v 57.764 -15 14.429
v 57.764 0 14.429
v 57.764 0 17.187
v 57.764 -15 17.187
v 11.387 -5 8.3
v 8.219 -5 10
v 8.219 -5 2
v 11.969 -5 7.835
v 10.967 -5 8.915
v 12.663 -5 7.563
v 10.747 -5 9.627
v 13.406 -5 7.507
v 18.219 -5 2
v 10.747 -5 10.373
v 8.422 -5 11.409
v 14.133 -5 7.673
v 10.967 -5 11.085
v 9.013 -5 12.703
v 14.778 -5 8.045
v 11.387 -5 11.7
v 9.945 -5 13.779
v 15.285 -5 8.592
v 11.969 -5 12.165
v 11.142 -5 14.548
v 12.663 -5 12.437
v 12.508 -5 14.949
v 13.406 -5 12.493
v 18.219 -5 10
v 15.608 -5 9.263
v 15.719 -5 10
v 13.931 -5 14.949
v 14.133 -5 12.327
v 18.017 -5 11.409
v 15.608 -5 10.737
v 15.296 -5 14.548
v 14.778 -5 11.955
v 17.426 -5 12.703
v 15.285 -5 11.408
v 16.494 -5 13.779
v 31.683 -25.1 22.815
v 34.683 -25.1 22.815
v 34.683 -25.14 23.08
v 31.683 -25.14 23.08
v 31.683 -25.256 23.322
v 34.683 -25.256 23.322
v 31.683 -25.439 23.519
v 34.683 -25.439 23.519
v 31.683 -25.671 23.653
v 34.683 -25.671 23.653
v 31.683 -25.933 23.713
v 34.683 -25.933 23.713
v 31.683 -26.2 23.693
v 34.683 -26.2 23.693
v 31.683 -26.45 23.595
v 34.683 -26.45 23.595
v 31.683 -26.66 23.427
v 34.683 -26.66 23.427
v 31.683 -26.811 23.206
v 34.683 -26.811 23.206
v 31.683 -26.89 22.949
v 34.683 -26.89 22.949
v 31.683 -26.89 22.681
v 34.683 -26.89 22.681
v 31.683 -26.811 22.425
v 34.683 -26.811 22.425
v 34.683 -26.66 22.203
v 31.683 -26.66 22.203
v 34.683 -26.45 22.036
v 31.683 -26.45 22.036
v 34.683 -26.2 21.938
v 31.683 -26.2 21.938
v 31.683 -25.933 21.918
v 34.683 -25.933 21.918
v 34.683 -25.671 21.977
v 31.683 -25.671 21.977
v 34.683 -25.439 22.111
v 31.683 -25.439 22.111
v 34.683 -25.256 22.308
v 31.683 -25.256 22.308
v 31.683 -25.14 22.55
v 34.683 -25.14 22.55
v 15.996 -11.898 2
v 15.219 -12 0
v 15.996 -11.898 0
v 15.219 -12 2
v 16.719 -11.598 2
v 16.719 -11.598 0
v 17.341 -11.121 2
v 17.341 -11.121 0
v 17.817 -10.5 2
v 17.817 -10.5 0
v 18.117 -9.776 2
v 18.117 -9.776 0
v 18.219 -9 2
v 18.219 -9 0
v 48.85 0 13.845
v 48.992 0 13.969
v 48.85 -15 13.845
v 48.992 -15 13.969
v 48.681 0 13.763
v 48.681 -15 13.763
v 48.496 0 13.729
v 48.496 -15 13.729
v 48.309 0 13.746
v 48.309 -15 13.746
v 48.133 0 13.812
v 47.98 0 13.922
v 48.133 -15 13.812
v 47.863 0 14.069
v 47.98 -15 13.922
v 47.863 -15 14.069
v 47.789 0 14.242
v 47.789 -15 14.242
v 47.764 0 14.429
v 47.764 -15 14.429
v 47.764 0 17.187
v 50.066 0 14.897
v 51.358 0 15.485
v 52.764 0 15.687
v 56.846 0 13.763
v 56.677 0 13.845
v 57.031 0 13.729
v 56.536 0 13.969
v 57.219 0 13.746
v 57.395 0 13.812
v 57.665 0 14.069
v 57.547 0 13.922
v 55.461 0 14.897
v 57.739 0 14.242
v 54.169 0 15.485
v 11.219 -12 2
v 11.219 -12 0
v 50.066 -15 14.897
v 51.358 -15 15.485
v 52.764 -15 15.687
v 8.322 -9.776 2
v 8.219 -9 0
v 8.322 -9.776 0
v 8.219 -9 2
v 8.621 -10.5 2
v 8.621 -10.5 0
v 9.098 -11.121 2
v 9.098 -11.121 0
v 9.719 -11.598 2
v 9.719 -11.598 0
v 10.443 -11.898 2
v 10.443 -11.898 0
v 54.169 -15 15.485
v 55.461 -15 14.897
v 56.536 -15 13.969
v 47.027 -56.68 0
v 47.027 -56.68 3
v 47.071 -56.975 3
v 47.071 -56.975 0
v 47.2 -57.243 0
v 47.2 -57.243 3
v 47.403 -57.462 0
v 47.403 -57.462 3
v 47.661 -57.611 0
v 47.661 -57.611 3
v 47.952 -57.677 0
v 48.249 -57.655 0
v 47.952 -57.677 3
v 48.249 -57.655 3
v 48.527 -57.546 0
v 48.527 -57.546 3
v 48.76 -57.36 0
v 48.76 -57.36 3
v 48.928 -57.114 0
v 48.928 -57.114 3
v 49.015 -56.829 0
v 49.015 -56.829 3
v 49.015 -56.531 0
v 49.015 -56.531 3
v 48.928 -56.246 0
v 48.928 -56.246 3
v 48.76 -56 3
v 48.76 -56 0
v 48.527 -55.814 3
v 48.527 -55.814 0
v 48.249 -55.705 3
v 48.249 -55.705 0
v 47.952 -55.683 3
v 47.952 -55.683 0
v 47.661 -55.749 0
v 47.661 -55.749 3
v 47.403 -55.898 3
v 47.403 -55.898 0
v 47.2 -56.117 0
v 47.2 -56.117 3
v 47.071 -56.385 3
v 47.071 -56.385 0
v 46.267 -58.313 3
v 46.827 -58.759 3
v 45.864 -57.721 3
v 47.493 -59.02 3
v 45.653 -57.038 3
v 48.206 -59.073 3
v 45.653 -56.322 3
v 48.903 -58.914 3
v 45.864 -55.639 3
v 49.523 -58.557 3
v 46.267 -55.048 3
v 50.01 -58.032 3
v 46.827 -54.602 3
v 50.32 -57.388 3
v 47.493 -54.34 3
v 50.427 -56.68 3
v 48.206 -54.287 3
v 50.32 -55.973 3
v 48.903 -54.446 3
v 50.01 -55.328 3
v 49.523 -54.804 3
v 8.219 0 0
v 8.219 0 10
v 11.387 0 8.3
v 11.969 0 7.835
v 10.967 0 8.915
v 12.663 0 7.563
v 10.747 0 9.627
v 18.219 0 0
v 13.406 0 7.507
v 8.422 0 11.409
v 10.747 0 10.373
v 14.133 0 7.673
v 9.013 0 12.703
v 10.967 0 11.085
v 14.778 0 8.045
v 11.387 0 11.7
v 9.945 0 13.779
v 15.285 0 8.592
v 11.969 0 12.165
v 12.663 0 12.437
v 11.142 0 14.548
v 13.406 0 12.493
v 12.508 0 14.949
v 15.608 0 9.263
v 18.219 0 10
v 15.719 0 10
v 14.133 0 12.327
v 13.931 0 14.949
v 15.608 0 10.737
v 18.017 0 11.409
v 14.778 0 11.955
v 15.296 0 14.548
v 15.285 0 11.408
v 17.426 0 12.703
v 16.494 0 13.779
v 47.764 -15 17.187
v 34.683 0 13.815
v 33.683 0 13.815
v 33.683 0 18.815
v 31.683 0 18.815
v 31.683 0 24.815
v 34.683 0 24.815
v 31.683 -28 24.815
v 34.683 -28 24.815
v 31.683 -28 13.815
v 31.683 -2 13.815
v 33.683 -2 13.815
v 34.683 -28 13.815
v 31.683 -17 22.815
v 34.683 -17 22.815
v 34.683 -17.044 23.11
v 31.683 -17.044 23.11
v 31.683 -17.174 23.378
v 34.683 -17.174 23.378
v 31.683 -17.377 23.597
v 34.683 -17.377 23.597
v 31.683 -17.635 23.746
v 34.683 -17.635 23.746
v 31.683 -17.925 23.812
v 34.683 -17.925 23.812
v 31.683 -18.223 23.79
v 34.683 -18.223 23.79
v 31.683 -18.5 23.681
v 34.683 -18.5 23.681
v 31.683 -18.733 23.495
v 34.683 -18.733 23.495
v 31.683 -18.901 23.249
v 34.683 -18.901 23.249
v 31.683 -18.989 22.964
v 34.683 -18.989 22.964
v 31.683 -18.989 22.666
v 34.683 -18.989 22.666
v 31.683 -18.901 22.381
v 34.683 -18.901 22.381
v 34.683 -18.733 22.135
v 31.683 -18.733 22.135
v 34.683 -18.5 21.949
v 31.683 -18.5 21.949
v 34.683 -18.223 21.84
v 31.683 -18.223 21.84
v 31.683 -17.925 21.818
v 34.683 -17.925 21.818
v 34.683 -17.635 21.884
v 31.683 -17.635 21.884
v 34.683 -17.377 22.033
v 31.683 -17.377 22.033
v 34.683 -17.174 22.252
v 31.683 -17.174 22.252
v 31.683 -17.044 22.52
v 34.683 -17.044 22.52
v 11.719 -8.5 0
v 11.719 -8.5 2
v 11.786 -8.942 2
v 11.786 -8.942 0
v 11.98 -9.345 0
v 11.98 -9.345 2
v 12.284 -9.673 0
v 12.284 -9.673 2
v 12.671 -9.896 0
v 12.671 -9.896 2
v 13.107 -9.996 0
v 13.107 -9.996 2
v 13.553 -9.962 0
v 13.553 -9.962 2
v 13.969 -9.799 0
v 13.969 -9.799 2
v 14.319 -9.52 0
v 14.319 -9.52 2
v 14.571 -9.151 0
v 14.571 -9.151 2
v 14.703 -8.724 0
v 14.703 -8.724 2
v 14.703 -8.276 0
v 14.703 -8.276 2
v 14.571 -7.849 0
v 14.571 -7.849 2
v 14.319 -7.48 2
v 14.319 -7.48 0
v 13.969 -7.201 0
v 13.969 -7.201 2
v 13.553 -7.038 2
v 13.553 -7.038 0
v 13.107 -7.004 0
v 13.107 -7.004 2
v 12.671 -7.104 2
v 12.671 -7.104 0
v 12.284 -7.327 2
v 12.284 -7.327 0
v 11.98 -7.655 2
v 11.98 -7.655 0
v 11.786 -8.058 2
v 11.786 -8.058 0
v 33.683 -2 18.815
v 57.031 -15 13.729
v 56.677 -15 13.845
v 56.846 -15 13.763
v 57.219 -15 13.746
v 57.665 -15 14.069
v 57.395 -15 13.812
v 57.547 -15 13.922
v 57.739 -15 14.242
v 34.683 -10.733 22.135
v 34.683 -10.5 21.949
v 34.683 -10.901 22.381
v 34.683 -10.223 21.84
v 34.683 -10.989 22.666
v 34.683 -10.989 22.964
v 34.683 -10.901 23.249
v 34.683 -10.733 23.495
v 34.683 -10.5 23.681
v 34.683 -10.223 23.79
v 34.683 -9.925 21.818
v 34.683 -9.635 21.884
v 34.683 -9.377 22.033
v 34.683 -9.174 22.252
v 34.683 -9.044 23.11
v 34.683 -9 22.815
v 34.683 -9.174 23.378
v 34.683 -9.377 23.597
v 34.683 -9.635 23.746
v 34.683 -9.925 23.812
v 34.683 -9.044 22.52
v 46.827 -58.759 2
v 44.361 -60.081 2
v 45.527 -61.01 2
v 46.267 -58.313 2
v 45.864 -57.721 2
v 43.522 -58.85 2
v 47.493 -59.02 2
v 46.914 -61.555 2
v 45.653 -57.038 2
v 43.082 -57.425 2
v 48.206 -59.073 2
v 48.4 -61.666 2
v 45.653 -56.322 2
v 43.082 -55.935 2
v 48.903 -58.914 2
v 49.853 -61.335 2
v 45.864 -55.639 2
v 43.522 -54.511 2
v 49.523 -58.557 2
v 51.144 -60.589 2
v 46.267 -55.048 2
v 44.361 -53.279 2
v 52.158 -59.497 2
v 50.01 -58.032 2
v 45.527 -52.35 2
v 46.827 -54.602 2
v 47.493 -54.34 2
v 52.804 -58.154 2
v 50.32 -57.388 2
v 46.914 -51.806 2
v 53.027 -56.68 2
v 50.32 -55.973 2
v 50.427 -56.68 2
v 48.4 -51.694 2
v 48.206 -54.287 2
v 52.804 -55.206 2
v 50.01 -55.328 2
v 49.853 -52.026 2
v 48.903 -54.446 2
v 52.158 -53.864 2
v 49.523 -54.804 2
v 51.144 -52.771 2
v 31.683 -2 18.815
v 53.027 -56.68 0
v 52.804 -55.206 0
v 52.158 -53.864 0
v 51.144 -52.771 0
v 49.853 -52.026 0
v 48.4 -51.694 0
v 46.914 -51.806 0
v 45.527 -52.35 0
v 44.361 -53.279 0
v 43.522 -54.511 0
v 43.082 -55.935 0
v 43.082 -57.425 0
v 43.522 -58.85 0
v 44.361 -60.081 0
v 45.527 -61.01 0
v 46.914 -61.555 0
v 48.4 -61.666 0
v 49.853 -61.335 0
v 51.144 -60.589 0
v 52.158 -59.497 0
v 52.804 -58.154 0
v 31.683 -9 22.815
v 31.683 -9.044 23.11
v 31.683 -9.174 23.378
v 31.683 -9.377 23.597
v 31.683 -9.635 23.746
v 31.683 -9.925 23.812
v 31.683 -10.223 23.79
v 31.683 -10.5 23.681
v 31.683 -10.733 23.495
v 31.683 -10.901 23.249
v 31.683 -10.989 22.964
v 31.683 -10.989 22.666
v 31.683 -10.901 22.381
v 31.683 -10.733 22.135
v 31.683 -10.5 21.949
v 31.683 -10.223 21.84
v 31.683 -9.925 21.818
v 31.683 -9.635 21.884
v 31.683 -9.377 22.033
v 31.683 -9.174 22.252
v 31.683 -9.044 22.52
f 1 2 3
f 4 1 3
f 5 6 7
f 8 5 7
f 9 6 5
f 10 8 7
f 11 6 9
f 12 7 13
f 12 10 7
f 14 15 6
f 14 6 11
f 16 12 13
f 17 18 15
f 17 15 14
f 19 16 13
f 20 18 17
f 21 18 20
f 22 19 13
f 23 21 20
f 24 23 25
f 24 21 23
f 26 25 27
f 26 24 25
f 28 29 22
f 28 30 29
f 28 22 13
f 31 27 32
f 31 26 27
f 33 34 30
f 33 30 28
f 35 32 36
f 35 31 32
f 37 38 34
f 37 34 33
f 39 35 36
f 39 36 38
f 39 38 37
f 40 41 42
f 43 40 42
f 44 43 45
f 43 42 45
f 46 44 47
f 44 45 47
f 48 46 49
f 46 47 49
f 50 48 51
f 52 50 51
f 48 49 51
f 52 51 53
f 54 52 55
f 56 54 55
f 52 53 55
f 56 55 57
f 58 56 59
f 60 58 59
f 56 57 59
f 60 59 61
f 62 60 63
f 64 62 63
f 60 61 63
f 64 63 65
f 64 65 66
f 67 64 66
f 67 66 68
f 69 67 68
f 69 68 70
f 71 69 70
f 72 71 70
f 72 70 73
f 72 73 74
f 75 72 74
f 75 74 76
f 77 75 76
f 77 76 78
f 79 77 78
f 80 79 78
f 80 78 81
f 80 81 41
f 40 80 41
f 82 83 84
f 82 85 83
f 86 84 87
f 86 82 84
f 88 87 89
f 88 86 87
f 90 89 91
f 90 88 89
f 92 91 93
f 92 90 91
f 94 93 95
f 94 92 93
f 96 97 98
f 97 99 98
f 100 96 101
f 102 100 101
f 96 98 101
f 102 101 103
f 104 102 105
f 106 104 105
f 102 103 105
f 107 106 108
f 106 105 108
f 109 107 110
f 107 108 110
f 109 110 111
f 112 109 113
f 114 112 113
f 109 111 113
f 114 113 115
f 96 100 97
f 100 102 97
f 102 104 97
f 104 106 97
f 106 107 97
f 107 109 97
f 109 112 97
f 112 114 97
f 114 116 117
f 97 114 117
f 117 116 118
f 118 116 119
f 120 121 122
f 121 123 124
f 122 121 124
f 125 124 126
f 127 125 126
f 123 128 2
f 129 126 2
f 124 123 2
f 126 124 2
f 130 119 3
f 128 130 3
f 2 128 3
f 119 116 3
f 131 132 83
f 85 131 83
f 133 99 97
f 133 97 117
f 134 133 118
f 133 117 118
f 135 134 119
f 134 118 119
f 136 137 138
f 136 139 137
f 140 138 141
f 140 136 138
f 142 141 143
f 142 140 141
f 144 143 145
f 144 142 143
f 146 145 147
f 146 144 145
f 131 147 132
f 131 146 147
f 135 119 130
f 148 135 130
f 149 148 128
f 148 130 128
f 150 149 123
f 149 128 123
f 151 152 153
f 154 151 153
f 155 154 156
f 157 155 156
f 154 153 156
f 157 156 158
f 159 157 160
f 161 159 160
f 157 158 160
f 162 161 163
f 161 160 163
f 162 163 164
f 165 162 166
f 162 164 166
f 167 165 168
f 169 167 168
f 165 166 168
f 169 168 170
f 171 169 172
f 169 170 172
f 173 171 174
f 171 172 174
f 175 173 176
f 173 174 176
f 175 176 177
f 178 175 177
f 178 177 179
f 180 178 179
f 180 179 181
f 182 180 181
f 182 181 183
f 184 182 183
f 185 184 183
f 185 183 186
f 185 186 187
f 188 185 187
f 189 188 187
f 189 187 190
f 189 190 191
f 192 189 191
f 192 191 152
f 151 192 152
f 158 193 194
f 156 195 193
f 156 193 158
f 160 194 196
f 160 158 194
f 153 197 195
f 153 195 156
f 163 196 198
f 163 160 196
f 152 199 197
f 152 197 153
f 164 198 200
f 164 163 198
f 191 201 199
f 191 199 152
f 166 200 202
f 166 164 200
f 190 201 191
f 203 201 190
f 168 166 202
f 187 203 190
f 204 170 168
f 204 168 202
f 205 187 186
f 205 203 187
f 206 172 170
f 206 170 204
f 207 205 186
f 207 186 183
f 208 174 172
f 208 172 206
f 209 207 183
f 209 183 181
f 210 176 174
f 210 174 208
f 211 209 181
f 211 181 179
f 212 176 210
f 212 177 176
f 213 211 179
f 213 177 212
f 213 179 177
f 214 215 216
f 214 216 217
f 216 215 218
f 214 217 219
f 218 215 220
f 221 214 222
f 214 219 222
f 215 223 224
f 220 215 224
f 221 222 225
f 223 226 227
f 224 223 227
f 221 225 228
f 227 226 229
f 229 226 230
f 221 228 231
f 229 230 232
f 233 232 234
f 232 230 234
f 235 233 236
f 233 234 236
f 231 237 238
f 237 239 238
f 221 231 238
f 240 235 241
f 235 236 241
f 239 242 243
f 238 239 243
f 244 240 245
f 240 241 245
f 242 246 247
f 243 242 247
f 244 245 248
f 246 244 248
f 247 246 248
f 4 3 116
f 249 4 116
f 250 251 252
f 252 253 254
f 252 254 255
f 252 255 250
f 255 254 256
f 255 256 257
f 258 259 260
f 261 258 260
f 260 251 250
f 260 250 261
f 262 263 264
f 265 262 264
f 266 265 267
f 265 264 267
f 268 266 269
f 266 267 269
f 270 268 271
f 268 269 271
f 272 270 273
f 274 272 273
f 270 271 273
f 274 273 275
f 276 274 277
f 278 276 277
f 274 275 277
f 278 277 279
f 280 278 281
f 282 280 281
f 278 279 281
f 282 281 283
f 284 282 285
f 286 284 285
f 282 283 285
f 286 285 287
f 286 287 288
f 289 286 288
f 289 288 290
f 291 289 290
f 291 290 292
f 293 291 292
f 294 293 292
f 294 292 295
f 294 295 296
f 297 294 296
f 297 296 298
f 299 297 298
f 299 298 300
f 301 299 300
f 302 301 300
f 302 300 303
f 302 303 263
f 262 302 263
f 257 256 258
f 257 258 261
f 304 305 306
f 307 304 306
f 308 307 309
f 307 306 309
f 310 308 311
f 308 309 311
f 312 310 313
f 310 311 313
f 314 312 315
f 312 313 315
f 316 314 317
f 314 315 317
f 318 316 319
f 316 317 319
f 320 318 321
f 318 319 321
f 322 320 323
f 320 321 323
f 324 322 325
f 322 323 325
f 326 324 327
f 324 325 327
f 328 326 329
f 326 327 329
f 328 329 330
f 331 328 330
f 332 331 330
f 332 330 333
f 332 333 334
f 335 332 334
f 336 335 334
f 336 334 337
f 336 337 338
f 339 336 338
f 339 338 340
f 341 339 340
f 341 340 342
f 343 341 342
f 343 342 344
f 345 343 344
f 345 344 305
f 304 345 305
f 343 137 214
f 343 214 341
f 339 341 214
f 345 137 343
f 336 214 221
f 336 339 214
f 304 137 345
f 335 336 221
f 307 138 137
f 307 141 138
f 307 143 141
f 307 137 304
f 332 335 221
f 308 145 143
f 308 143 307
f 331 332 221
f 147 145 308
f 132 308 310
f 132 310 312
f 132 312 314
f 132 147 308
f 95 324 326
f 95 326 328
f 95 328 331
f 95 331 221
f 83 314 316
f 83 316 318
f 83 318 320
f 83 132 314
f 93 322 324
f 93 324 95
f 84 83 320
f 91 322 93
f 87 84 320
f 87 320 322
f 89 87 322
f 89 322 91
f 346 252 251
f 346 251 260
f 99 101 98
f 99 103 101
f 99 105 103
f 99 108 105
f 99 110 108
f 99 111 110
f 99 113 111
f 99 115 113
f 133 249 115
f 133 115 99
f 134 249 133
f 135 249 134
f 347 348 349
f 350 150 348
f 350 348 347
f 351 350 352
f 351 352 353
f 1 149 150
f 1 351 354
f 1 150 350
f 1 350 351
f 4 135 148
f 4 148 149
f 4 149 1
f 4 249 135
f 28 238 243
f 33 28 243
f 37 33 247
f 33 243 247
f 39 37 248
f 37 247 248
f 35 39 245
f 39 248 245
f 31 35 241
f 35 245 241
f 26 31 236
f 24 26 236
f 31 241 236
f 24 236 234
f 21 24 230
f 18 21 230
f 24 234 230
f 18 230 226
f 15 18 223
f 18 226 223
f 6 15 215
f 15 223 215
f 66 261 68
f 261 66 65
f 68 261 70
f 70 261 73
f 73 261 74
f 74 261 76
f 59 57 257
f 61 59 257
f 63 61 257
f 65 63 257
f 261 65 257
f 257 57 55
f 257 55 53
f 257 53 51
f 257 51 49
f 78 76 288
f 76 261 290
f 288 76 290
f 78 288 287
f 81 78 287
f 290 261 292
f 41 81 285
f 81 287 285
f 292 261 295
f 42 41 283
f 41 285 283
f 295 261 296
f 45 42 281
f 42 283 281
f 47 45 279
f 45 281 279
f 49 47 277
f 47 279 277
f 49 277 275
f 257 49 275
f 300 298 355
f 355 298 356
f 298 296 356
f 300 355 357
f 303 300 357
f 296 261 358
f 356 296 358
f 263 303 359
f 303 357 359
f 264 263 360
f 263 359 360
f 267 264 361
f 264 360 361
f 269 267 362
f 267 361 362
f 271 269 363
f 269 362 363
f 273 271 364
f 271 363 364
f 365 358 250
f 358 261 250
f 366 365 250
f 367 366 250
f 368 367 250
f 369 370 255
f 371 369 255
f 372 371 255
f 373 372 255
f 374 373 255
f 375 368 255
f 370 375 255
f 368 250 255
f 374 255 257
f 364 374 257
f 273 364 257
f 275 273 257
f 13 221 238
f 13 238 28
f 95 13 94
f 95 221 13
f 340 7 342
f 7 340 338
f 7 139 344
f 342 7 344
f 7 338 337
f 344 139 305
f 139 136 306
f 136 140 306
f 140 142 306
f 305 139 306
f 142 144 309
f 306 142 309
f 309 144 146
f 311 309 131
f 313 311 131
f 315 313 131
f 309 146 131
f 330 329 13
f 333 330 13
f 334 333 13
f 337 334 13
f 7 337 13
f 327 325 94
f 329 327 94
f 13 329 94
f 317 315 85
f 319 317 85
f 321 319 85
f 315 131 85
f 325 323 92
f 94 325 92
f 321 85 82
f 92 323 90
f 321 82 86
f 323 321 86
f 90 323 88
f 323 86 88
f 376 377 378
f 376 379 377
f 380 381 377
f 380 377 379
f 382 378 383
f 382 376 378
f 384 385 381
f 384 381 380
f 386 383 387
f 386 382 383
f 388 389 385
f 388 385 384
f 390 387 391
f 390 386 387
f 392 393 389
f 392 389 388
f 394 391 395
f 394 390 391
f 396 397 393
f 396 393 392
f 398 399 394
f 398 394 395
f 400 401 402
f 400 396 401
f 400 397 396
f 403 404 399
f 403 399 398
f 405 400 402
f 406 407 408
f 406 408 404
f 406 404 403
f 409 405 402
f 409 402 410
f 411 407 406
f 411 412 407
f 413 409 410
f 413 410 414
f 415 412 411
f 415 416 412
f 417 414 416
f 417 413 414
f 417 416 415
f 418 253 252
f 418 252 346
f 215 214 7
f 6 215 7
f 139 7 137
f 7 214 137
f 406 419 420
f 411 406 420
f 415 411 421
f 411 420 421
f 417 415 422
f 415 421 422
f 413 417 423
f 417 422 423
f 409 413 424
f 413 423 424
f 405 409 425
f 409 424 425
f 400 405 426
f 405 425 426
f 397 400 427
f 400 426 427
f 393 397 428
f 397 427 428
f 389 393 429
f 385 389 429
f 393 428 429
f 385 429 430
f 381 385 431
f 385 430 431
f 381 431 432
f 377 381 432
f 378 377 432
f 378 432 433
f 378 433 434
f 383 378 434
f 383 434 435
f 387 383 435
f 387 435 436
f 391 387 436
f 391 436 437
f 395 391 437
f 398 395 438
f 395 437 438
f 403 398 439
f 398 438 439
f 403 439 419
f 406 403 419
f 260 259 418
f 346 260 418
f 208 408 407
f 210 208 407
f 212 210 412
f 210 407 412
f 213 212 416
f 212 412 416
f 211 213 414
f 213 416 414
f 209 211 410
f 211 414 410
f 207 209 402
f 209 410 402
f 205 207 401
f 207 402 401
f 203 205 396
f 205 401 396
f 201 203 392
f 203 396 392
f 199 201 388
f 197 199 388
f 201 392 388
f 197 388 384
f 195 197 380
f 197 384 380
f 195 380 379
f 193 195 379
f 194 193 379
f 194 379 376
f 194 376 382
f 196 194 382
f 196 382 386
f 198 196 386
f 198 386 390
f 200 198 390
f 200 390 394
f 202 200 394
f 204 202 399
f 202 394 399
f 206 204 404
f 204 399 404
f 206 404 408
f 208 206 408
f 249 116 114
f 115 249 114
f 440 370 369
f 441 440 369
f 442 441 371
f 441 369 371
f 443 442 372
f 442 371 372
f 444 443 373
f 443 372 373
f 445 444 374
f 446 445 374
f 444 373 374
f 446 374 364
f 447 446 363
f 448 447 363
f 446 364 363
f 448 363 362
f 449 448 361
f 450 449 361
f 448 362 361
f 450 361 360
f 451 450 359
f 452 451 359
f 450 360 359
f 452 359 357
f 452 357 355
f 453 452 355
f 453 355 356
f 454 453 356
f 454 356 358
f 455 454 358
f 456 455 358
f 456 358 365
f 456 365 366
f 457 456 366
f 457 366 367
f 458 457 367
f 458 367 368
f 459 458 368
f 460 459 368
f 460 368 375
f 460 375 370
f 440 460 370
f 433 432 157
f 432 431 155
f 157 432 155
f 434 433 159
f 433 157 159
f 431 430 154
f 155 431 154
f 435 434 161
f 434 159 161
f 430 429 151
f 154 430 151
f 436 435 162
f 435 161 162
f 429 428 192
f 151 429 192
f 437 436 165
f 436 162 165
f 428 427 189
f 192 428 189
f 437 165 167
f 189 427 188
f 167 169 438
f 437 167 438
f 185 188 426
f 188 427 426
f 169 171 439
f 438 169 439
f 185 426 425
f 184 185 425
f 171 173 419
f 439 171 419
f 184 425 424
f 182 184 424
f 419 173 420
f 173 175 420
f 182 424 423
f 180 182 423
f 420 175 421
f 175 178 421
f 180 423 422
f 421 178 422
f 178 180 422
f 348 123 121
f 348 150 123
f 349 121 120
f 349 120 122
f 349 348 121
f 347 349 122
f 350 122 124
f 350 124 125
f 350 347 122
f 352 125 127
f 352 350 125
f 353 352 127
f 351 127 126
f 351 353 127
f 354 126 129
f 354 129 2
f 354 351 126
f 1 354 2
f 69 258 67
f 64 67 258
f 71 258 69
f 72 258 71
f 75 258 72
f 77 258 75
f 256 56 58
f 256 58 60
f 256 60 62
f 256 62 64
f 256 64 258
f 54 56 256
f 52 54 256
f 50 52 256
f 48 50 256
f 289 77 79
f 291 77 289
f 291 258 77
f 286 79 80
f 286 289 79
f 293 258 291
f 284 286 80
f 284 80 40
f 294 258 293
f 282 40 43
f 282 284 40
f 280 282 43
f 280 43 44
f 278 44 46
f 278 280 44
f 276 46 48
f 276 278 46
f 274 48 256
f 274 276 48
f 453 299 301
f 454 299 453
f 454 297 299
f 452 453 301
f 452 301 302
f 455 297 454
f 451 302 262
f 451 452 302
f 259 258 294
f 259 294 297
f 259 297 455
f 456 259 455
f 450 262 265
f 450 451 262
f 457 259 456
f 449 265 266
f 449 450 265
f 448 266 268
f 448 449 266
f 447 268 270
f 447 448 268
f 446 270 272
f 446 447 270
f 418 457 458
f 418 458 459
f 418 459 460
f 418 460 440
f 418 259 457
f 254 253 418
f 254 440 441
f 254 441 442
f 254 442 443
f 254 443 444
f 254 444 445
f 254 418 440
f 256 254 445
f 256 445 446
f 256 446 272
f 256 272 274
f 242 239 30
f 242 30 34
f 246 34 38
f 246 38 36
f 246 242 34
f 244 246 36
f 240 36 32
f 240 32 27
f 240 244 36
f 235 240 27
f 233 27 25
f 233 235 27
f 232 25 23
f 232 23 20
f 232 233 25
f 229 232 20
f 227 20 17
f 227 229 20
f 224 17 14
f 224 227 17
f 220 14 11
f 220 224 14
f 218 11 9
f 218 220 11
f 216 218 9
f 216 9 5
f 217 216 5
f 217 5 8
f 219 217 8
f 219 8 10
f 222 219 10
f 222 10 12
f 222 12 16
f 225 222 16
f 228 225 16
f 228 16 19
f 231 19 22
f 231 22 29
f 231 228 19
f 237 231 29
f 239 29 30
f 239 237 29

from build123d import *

# Parameters (mm, degrees)
F0_R      = 2.5
F1_DEPTH  = 5
F2_W      = 10
F2_H      = 7
F3_DEPTH  = 2
F4_D      = 3
F5_R      = 3
F6_W      = 3
F6_H      = 11
F7_DEPTH  = 28
F8_W      = 2
F8_H      = 5
F9_DEPTH  = 2
F10_D     = 2
F11_D     = 1.8
F13_DEPTH = 15
F14_R     = 0.7
F15_R     = 5
F16_DEPTH = 2
F17_R     = 2.4
F18_DEPTH = 1
F19_D     = 2


with BuildPart() as f1:
    # F0 (on Front) → F1 (new body)
    with BuildSketch(Plane.XZ):
        with BuildLine():
            ThreePointArc((8.2193245501, 10), (13.2193245501, 5), (18.2193245501, 10))
            ThreePointArc((18.2193245501, 10), (13.2193245501, 15), (8.2193245501, 10))
        make_face()
        with Locations((13.2193245501, 10)):
            Circle(F0_R, mode=Mode.SUBTRACT)
        with BuildLine():
            Line((18.2193245501, 0), (18.2193245501, 10))
            ThreePointArc((18.2193245501, 10), (13.2193245501, 5), (8.2193245501, 10))
            Line((8.2193245501, 10), (8.2193245501, 0))
            Line((8.2193245501, 0), (18.2193245501, 0))
        make_face()
    extrude(amount=F1_DEPTH)

    # F2 (on face) → F3 (join)
    with BuildSketch(Plane(origin=(0, 0, 0), x_dir=(1, 0, 0), z_dir=(0, 0, -1))):
        with Locations((13.2193245501, 8.5)):
            Rectangle(F2_W, F2_H)
    extrude(amount=-F3_DEPTH)

    # F4 (through all)
    with Locations(Plane(origin=(0, 0, 0), x_dir=(1, 0, 0), z_dir=(0, 0, -1))):
        with Locations((13.2193245501, 8.5)):
            Hole(F4_D / 2)

    # F5
    f5_edges = [f1.edges().sort_by_distance(p)[0] for p in [
        (18.219325, -12, 1),
        (8.219325, -12, 1),
    ]]
    fillet(f5_edges, radius=F5_R)


with BuildPart() as f7:
    # F6 (on Front) → F7 (new body)
    with BuildSketch(Plane.XZ):
        with Locations((33.1831105284, 19.3150802515)):
            Rectangle(F6_W, F6_H)
    extrude(amount=F7_DEPTH)

    # F8 (on face) → F9 (cut)
    with BuildSketch(Plane(origin=(31.6831105284, 0, 0), x_dir=(0, -1, 0), z_dir=(-1, 0, 0))):
        with Locations((1, 16.3150802515)):
            Rectangle(F8_W, F8_H)
    extrude(amount=-F9_DEPTH, mode=Mode.SUBTRACT)

    # F10 (through all)
    with Locations(Plane(origin=(31.6831105284, 0, 0), x_dir=(0, -1, 0), z_dir=(-1, 0, 0))):
        with Locations((10, 22.8150802515), (18, 22.8150802515)):
            Hole(F10_D / 2)

    # F11 (through all)
    with Locations(Plane(origin=(31.6831105284, 0, 0), x_dir=(0, -1, 0), z_dir=(-1, 0, 0))):
        with Locations((26, 22.8150802515)):
            Hole(F11_D / 2)


with BuildPart() as f13:
    # F12 (on Front) → F13 (new body)
    with BuildSketch(Plane.XZ):
        with BuildLine():
            Line((52.7637679825, 15.6870161557), (47.7637679825, 15.6870161557))
            Line((47.7637679825, 15.6870161557), (47.7637679825, 10.6870161557))
            ThreePointArc((47.7637679825, 10.6870161557), (49.2282340766, 14.2225500616), (52.7637679825, 15.6870161557))
        make_face()
        Polygon((57.7637679825, 17.1870161557), (47.7637679825, 17.1870161557), (47.7637679825, 15.6870161557), (52.7637679825, 15.6870161557), (57.7637679825, 15.6870161557), align=None)
        with BuildLine():
            Line((57.7637679825, 10.6870161557), (57.7637679825, 15.6870161557))
            Line((57.7637679825, 15.6870161557), (52.7637679825, 15.6870161557))
            ThreePointArc((52.7637679825, 15.6870161557), (56.2993018884, 14.2225500616), (57.7637679825, 10.6870161557))
        make_face()
    extrude(amount=F13_DEPTH)

    # F14
    f14_edges = [f13.edges().sort_by_distance(p)[0] for p in [
        (47.763768, -7.5, 10.687016),
        (57.763768, -7.5, 10.687016),
    ]]
    fillet(f14_edges, radius=F14_R)


with BuildPart() as f16:
    # F15 (on Top) → F16 (new body)
    with BuildSketch(Plane.XY):
        with Locations((48.0265580118, -56.6801726818)):
            Circle(F15_R)
    extrude(amount=F16_DEPTH)

    # F17 (on face) → F18 (join)
    with BuildSketch(Plane.XY.offset(2)):
        with Locations((48.0265580118, -56.6801726818)):
            Circle(F17_R)
    extrude(amount=F18_DEPTH)

    # F19 (through all)
    with Locations(Plane(origin=(0, 0, 0), x_dir=(1, 0, 0), z_dir=(0, 0, -1))):
        with Locations((48.0265580118, 56.6801726818)):
            Hole(F19_D / 2)


solid = Compound([f1.part, f7.part, f13.part, f16.part])
